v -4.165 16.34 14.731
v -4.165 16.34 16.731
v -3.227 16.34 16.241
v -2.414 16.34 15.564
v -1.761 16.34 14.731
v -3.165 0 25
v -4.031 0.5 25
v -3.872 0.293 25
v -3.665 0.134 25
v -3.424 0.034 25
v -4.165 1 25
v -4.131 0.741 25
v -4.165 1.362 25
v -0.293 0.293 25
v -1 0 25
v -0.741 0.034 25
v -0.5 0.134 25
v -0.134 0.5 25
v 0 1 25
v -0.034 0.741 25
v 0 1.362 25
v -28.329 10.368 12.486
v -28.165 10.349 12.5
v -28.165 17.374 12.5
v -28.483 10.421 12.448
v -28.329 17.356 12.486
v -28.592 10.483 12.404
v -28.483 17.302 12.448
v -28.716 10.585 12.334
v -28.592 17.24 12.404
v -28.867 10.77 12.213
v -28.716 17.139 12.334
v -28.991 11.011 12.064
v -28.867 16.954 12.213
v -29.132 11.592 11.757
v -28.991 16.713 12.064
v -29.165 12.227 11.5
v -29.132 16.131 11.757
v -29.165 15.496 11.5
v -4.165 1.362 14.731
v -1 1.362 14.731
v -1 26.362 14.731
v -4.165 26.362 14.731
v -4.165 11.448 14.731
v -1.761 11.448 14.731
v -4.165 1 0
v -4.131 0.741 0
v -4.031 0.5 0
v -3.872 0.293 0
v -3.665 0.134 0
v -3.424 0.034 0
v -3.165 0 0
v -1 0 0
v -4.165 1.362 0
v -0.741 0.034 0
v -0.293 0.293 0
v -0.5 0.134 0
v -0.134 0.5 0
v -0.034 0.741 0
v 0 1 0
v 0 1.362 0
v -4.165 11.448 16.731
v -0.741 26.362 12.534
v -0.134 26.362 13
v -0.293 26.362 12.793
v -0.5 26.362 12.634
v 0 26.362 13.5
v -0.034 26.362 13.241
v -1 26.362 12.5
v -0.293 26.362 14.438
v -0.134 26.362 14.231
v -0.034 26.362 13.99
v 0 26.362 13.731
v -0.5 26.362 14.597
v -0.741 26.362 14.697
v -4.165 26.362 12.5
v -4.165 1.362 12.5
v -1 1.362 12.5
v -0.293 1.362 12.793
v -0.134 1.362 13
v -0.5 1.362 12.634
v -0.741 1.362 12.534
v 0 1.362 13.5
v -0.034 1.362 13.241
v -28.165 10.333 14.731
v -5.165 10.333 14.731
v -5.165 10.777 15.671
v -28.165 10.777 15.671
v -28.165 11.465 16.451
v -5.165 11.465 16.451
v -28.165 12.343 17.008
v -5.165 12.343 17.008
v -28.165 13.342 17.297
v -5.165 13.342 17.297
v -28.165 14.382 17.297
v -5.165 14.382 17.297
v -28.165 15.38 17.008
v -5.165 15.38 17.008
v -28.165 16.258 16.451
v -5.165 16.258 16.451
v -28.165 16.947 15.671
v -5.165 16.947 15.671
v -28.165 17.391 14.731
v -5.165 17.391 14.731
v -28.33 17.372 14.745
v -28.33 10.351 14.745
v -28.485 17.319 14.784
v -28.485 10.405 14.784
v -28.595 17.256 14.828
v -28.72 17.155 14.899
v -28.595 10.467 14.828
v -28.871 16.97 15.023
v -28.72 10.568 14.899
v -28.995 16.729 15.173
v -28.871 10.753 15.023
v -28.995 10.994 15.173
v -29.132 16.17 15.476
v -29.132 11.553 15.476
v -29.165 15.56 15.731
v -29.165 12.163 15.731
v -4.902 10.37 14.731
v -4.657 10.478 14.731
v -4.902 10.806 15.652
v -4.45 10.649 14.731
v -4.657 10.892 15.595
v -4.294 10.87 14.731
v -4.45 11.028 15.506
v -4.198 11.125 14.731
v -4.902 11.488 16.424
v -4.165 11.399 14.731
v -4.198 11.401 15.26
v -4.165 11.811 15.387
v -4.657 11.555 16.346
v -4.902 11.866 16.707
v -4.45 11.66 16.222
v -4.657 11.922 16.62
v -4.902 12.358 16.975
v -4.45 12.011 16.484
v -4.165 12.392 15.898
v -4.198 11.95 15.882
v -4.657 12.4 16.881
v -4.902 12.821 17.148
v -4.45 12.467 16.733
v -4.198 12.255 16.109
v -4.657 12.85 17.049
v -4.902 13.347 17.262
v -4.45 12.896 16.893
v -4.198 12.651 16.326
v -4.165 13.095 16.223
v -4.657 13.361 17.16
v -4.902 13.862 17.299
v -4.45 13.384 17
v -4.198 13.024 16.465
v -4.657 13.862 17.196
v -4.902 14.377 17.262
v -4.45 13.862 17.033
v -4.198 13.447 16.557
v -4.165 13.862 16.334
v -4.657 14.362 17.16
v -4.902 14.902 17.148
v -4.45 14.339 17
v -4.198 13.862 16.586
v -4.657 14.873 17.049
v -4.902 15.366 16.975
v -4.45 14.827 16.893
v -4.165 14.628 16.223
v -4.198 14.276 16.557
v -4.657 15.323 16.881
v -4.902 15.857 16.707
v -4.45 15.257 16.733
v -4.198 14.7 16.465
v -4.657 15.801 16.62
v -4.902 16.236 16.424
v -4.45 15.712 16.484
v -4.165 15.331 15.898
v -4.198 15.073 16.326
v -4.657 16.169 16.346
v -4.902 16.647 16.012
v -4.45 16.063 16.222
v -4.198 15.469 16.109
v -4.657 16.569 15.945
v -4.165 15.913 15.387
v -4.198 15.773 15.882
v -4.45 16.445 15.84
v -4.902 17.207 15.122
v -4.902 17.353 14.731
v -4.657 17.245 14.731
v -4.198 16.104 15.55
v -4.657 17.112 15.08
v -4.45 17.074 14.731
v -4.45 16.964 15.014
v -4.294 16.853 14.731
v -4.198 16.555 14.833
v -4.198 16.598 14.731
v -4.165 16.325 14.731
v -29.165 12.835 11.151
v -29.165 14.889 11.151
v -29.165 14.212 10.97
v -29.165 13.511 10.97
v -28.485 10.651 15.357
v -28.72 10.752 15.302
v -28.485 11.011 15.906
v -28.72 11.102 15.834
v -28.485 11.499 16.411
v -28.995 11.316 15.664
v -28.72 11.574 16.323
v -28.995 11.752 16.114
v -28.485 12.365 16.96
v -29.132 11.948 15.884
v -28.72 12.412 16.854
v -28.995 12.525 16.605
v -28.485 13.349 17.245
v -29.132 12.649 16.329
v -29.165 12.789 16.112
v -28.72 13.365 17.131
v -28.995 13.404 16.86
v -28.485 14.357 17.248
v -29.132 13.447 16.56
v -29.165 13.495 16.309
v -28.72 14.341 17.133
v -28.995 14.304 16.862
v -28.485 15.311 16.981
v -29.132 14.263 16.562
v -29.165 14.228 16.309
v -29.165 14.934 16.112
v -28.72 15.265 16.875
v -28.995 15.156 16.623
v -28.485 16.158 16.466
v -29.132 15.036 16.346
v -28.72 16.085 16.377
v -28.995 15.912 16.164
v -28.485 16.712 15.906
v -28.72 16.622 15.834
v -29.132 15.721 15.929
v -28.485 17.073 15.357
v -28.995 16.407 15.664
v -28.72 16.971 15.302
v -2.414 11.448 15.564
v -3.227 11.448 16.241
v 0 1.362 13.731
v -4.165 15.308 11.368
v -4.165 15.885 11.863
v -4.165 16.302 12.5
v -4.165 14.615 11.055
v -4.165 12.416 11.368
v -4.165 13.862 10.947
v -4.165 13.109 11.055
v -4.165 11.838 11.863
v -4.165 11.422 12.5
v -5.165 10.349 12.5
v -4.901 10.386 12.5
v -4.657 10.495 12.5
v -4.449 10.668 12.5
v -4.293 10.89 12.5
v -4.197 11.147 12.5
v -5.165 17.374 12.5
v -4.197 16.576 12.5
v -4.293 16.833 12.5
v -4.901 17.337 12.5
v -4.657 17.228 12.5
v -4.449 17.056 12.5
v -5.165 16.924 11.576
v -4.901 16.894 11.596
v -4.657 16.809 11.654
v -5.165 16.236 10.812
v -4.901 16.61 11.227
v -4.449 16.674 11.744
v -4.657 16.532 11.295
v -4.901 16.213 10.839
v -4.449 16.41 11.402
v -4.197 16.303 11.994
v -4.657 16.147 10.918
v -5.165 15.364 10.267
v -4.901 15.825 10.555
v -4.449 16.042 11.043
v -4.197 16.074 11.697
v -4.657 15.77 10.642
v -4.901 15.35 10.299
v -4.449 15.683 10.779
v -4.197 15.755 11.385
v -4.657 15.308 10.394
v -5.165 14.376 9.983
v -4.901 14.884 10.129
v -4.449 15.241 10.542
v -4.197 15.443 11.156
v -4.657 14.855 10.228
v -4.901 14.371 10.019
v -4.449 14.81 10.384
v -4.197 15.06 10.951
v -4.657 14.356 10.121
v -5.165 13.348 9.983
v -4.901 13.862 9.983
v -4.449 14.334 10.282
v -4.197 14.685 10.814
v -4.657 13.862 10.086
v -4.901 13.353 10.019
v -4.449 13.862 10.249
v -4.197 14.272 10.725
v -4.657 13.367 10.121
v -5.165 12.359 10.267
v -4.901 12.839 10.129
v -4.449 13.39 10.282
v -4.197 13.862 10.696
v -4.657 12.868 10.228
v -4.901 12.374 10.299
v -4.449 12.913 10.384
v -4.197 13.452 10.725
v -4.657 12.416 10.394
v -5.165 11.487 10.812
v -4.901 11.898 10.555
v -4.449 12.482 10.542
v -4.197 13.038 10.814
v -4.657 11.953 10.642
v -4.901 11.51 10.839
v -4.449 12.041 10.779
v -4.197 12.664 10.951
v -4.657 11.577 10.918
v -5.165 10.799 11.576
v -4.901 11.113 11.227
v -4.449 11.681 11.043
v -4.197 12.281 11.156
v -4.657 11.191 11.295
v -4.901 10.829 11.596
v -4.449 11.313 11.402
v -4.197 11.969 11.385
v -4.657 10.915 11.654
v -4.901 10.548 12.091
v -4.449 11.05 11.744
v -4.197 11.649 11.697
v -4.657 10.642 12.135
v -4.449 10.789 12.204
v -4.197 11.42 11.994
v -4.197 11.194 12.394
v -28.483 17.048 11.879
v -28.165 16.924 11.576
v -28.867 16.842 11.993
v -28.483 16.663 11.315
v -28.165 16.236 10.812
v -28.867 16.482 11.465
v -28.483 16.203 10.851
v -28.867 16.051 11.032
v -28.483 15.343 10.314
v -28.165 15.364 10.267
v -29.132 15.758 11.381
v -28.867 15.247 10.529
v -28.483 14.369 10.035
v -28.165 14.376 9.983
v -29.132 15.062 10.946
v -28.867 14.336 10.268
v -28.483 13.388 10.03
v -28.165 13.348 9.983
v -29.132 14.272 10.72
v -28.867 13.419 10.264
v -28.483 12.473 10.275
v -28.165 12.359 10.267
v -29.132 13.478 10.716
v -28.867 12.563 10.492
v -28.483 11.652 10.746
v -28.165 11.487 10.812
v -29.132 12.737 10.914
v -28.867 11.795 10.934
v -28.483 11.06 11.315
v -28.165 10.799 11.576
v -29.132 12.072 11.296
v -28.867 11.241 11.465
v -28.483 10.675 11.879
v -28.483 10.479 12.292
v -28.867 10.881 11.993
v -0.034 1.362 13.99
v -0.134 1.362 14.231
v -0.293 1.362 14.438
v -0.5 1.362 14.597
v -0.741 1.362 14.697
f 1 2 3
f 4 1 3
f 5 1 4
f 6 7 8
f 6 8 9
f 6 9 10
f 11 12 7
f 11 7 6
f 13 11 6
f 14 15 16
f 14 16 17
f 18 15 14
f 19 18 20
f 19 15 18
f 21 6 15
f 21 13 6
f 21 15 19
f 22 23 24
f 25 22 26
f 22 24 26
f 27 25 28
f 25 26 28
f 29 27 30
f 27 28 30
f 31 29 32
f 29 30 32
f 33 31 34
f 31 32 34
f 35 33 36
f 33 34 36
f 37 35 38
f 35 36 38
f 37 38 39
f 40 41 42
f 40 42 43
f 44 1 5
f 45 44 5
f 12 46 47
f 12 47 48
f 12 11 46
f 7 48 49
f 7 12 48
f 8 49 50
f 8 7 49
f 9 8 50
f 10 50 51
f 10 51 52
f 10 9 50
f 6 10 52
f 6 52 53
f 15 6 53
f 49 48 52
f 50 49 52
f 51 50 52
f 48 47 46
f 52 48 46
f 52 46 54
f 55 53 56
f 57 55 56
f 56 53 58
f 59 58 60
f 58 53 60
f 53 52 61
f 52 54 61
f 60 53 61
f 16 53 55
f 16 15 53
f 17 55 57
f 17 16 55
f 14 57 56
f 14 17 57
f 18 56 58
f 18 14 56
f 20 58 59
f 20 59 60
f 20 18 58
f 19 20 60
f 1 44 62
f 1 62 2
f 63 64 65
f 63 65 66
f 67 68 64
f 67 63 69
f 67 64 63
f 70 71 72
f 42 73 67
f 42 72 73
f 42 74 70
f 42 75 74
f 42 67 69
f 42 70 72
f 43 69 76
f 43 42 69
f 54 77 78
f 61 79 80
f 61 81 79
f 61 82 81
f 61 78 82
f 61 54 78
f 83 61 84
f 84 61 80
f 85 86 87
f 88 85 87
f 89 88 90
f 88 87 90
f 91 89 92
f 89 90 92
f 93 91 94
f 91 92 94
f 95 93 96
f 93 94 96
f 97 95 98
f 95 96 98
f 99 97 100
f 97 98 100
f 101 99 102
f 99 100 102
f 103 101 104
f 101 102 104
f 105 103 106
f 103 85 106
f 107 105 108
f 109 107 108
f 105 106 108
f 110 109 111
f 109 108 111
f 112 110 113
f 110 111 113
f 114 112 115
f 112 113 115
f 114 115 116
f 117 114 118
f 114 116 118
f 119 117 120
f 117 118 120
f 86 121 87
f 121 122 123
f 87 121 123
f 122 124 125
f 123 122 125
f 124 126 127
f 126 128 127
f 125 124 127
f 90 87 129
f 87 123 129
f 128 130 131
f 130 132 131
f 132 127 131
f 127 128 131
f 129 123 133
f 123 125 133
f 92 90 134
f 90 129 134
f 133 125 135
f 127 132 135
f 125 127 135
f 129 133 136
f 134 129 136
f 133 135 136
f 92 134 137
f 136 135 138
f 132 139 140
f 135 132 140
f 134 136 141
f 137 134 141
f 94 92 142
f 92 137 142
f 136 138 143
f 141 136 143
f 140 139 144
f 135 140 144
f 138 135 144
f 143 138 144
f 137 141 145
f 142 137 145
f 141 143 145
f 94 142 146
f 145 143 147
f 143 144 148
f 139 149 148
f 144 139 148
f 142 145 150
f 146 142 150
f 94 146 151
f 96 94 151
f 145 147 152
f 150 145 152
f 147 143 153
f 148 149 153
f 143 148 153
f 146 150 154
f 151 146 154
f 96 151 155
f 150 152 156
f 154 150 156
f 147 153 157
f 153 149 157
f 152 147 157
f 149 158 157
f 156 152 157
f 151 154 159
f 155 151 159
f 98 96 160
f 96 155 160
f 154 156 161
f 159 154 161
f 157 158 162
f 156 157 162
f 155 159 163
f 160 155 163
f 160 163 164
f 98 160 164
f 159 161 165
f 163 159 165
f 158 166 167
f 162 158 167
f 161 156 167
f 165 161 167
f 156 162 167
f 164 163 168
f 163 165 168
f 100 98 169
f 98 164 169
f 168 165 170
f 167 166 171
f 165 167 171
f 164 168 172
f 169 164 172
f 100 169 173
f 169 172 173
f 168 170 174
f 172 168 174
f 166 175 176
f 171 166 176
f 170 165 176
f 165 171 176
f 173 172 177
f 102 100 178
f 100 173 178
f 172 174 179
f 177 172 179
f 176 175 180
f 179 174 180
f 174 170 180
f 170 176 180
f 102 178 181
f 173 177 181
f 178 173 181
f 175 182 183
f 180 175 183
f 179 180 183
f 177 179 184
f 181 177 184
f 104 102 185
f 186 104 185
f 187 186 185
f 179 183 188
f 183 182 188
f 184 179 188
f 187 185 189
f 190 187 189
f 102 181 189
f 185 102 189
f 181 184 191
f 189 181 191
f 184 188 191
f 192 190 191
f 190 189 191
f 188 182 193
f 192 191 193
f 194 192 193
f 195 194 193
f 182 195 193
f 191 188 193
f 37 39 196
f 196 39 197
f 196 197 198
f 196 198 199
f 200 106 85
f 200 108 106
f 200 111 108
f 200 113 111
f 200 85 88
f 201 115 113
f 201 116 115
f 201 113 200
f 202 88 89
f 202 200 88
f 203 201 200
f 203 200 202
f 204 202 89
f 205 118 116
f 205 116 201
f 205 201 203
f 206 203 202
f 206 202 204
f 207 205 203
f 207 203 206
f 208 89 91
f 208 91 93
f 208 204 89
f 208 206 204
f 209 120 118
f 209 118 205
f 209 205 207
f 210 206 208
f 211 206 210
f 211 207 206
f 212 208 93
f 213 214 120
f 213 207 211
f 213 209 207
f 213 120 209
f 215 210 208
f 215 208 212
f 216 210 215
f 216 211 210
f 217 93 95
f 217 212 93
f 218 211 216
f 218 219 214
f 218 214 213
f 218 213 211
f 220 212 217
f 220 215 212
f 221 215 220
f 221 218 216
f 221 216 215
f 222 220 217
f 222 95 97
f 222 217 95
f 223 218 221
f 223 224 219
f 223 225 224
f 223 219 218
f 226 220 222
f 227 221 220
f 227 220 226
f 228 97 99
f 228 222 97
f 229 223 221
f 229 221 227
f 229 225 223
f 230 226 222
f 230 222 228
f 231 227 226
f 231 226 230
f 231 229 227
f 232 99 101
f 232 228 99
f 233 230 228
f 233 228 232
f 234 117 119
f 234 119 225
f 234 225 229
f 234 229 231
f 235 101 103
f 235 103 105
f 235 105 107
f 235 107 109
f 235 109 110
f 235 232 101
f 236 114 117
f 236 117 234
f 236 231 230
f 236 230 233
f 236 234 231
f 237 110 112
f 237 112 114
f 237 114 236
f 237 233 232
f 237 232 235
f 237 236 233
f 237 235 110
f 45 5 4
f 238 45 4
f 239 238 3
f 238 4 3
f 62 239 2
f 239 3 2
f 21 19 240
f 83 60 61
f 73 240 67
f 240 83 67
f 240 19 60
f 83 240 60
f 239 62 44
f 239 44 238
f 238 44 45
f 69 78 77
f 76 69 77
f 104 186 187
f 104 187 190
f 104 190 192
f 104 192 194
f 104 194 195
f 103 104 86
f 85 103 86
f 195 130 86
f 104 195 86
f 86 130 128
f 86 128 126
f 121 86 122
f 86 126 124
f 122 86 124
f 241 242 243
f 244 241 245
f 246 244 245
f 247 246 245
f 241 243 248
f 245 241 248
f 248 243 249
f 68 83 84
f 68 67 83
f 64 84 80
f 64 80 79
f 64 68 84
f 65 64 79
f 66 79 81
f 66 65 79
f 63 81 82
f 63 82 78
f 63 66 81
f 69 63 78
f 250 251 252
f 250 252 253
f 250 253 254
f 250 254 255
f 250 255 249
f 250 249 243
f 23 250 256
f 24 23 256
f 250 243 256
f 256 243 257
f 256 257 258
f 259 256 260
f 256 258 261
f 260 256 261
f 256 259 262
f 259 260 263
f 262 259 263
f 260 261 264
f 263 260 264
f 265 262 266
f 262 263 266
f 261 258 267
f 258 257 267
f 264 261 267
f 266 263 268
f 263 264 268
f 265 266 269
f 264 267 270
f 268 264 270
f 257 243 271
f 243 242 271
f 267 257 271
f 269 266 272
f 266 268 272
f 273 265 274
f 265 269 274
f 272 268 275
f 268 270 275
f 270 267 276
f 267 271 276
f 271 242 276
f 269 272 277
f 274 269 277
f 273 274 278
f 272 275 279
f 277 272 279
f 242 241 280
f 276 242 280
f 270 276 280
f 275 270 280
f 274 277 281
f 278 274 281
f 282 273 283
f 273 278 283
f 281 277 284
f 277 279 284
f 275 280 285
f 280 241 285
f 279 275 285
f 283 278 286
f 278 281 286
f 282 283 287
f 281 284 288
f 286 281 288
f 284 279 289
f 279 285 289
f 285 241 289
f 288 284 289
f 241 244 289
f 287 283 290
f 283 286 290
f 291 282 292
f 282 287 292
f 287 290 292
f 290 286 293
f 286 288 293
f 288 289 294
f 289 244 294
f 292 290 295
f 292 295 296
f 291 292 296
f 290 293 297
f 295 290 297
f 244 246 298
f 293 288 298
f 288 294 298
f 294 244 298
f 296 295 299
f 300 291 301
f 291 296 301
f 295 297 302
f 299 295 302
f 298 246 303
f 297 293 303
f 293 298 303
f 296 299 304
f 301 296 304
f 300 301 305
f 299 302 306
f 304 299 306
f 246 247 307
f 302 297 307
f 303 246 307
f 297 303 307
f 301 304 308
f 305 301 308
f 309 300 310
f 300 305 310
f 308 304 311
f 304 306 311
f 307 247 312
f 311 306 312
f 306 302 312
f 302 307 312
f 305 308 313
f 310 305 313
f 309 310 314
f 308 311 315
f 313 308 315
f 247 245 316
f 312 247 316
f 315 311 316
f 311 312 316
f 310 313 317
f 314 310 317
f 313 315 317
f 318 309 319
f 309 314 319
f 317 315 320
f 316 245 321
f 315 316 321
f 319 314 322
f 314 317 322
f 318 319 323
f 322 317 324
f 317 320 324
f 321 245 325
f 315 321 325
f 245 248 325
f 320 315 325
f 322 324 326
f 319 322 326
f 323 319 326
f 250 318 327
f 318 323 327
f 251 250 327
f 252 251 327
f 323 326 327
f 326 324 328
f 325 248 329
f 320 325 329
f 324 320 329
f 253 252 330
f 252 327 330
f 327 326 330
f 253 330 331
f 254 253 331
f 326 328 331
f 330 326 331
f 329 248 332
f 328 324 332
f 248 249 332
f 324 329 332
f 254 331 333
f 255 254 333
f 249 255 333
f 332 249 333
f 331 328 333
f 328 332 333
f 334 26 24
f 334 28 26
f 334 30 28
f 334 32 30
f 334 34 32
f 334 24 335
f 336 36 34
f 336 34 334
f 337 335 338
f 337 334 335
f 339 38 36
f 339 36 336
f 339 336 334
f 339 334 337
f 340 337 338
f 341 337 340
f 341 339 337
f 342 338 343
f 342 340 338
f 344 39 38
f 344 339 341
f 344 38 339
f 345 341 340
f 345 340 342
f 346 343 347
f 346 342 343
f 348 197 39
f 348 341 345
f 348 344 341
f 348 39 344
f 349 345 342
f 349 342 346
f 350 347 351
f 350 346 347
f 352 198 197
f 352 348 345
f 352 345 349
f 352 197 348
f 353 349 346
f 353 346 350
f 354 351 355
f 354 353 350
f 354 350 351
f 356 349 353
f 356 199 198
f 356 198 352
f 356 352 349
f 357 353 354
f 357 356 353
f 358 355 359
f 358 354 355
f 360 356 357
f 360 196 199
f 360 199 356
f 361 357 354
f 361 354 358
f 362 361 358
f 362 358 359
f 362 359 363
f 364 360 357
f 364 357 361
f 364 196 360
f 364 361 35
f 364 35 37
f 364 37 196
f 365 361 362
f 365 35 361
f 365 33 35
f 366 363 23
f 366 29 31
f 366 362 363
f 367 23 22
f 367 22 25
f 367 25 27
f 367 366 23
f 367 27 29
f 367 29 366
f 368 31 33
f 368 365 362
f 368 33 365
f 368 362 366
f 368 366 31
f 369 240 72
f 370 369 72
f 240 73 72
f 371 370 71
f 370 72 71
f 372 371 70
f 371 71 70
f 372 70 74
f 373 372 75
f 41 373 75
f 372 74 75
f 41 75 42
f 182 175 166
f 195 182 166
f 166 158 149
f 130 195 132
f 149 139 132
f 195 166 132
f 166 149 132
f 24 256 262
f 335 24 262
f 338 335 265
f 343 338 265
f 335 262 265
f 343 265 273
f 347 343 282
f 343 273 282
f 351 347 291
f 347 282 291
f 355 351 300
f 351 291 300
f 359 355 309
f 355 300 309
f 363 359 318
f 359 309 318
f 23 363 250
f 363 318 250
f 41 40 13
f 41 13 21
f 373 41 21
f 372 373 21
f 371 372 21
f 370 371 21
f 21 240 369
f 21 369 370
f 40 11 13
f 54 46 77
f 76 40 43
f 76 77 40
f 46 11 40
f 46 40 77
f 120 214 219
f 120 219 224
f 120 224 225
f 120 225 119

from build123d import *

# Parameters (mm, degrees)
F0_W        = 4.1652182117
F0_H        = 1.361677656
F1_DEPTH    = 25
F2_W        = 4.1652182117
F2_H        = 2.2310467437
F3_DEPTH    = 25
F5_DEPTH    = 25
F6_R        = 1
F6_2_R      = 1
F6_3_R      = 1
F7_W        = 3.1652182117
F7_H        = 4.8921946436
F8_DEPTH    = 2
F9_T1_DEPTH = 28.1481486067


# Not quite as in the source:
# - a fillet or chamfer that OpenCascade refuses, or shapes differently, is made with other operations: its cross-section is extruded or revolved along the edge and cut away or added


with BuildPart() as f1:
    # F0 (on Top) → F1 (new body)
    with BuildSketch(Plane.XY):
        with Locations((-2.0826091059, 0.680838828)):
            Rectangle(F0_W, F0_H)
    extrude(amount=F1_DEPTH)

    # F2 (on face) → F3 (join)
    with BuildSketch(Plane(origin=(0, 1.361677656, 0), x_dir=(-1, 0, 0), z_dir=(0, 1, 0))):
        with Locations((2.0826091059, 13.6155233718)):
            Rectangle(F2_W, F2_H)
    extrude(amount=F3_DEPTH)

    # F6
    f6_edges = [f1.edges().sort_by_distance(p)[0] for p in [
        (-4.165218, 0, 12.5),
        (0, 0, 12.5),
        (0, 13.861678, 14.731047),
        (0, 13.861678, 12.5),
    ]]
    fillet(f6_edges, radius=F6_R)


with BuildPart() as f5:
    # F4 (on face) → F5 (new body)
    with BuildSketch(Plane(origin=(-4.1652182117, 0, 0), x_dir=(0, -1, 0), z_dir=(-1, 0, 0))):
        with BuildLine():
            Line((-17.3905032205, 14.7310467437), (-10.3328520914, 14.7310467437))
            ThreePointArc((-10.3328520914, 14.7310467437), (-13.861677656, 17.3342168413), (-17.3905032205, 14.7310467437))
        make_face()
    extrude(amount=F5_DEPTH)

    # F6#2
    f6_2_edges = [f5.edges().sort_by_distance(p)[0] for p in [
        (-4.165218, 13.861678, 17.334217),
        (-29.165218, 13.861678, 14.731047),
        (-29.165218, 13.861678, 17.334217),
    ]]
    fillet(f6_2_edges, radius=F6_2_R)


with BuildPart() as f5b:
    # F4 (on face) → F5, piece 2 (new body)
    with BuildSketch(Plane(origin=(-4.1652182117, 0, 0), x_dir=(0, -1, 0), z_dir=(-1, 0, 0))):
        with BuildLine():
            ThreePointArc((-17.3744763274, 12.5), (-13.861677656, 9.947413943), (-10.3488789845, 12.5))
            Line((-10.3488789845, 12.5), (-17.3744763274, 12.5))
        make_face()
    extrude(amount=F5_DEPTH)

    # F6#3
    f6_3_edges = [f5b.edges().sort_by_distance(p)[0] for p in [
        (-4.165218, 13.861678, 9.947414),
        (-29.165218, 13.861678, 9.947414),
        (-29.165218, 13.861678, 12.5),
    ]]
    fillet(f6_3_edges, radius=F6_3_R)


with BuildPart() as f8:
    # F7 (on face) → F8 (new body)
    with BuildSketch(Plane.XY.offset(14.7310467437)):
        with Locations((-2.5826091059, 13.8936350122)):
            Rectangle(F7_W, F7_H)
    extrude(amount=F8_DEPTH)

    # F9: fillet of radius 5 on 1 edges, made by hand

    # F9_s2 → F9_t1 (cut)
    with BuildSketch(Plane.XZ.offset(-27.9677093156)):
        with BuildLine():
            ThreePointArc((-1, 12.0798559511), (-1.8663630456, 14.8928695538), (-4.1652182117, 16.7310467437))
            Line((-4.1652182117, 16.7310467437), (-4.1285225759, 16.8240705595))
            ThreePointArc((-4.1285225759, 16.8240705595), (-2.5826091059, 16.8310467437), (-1, 16.8310467437))
            Line((-1, 16.8310467437), (-0.9, 16.7310467437))
            Line((-0.9, 16.7310467437), (-0.9, 12.0798559511))
            Line((-0.9, 12.0798559511), (-1, 12.0798559511))
        make_face()
    extrude(amount=F9_T1_DEPTH, mode=Mode.SUBTRACT)


solid = Compound([f1.part, f5.part, f5b.part, f8.part])
